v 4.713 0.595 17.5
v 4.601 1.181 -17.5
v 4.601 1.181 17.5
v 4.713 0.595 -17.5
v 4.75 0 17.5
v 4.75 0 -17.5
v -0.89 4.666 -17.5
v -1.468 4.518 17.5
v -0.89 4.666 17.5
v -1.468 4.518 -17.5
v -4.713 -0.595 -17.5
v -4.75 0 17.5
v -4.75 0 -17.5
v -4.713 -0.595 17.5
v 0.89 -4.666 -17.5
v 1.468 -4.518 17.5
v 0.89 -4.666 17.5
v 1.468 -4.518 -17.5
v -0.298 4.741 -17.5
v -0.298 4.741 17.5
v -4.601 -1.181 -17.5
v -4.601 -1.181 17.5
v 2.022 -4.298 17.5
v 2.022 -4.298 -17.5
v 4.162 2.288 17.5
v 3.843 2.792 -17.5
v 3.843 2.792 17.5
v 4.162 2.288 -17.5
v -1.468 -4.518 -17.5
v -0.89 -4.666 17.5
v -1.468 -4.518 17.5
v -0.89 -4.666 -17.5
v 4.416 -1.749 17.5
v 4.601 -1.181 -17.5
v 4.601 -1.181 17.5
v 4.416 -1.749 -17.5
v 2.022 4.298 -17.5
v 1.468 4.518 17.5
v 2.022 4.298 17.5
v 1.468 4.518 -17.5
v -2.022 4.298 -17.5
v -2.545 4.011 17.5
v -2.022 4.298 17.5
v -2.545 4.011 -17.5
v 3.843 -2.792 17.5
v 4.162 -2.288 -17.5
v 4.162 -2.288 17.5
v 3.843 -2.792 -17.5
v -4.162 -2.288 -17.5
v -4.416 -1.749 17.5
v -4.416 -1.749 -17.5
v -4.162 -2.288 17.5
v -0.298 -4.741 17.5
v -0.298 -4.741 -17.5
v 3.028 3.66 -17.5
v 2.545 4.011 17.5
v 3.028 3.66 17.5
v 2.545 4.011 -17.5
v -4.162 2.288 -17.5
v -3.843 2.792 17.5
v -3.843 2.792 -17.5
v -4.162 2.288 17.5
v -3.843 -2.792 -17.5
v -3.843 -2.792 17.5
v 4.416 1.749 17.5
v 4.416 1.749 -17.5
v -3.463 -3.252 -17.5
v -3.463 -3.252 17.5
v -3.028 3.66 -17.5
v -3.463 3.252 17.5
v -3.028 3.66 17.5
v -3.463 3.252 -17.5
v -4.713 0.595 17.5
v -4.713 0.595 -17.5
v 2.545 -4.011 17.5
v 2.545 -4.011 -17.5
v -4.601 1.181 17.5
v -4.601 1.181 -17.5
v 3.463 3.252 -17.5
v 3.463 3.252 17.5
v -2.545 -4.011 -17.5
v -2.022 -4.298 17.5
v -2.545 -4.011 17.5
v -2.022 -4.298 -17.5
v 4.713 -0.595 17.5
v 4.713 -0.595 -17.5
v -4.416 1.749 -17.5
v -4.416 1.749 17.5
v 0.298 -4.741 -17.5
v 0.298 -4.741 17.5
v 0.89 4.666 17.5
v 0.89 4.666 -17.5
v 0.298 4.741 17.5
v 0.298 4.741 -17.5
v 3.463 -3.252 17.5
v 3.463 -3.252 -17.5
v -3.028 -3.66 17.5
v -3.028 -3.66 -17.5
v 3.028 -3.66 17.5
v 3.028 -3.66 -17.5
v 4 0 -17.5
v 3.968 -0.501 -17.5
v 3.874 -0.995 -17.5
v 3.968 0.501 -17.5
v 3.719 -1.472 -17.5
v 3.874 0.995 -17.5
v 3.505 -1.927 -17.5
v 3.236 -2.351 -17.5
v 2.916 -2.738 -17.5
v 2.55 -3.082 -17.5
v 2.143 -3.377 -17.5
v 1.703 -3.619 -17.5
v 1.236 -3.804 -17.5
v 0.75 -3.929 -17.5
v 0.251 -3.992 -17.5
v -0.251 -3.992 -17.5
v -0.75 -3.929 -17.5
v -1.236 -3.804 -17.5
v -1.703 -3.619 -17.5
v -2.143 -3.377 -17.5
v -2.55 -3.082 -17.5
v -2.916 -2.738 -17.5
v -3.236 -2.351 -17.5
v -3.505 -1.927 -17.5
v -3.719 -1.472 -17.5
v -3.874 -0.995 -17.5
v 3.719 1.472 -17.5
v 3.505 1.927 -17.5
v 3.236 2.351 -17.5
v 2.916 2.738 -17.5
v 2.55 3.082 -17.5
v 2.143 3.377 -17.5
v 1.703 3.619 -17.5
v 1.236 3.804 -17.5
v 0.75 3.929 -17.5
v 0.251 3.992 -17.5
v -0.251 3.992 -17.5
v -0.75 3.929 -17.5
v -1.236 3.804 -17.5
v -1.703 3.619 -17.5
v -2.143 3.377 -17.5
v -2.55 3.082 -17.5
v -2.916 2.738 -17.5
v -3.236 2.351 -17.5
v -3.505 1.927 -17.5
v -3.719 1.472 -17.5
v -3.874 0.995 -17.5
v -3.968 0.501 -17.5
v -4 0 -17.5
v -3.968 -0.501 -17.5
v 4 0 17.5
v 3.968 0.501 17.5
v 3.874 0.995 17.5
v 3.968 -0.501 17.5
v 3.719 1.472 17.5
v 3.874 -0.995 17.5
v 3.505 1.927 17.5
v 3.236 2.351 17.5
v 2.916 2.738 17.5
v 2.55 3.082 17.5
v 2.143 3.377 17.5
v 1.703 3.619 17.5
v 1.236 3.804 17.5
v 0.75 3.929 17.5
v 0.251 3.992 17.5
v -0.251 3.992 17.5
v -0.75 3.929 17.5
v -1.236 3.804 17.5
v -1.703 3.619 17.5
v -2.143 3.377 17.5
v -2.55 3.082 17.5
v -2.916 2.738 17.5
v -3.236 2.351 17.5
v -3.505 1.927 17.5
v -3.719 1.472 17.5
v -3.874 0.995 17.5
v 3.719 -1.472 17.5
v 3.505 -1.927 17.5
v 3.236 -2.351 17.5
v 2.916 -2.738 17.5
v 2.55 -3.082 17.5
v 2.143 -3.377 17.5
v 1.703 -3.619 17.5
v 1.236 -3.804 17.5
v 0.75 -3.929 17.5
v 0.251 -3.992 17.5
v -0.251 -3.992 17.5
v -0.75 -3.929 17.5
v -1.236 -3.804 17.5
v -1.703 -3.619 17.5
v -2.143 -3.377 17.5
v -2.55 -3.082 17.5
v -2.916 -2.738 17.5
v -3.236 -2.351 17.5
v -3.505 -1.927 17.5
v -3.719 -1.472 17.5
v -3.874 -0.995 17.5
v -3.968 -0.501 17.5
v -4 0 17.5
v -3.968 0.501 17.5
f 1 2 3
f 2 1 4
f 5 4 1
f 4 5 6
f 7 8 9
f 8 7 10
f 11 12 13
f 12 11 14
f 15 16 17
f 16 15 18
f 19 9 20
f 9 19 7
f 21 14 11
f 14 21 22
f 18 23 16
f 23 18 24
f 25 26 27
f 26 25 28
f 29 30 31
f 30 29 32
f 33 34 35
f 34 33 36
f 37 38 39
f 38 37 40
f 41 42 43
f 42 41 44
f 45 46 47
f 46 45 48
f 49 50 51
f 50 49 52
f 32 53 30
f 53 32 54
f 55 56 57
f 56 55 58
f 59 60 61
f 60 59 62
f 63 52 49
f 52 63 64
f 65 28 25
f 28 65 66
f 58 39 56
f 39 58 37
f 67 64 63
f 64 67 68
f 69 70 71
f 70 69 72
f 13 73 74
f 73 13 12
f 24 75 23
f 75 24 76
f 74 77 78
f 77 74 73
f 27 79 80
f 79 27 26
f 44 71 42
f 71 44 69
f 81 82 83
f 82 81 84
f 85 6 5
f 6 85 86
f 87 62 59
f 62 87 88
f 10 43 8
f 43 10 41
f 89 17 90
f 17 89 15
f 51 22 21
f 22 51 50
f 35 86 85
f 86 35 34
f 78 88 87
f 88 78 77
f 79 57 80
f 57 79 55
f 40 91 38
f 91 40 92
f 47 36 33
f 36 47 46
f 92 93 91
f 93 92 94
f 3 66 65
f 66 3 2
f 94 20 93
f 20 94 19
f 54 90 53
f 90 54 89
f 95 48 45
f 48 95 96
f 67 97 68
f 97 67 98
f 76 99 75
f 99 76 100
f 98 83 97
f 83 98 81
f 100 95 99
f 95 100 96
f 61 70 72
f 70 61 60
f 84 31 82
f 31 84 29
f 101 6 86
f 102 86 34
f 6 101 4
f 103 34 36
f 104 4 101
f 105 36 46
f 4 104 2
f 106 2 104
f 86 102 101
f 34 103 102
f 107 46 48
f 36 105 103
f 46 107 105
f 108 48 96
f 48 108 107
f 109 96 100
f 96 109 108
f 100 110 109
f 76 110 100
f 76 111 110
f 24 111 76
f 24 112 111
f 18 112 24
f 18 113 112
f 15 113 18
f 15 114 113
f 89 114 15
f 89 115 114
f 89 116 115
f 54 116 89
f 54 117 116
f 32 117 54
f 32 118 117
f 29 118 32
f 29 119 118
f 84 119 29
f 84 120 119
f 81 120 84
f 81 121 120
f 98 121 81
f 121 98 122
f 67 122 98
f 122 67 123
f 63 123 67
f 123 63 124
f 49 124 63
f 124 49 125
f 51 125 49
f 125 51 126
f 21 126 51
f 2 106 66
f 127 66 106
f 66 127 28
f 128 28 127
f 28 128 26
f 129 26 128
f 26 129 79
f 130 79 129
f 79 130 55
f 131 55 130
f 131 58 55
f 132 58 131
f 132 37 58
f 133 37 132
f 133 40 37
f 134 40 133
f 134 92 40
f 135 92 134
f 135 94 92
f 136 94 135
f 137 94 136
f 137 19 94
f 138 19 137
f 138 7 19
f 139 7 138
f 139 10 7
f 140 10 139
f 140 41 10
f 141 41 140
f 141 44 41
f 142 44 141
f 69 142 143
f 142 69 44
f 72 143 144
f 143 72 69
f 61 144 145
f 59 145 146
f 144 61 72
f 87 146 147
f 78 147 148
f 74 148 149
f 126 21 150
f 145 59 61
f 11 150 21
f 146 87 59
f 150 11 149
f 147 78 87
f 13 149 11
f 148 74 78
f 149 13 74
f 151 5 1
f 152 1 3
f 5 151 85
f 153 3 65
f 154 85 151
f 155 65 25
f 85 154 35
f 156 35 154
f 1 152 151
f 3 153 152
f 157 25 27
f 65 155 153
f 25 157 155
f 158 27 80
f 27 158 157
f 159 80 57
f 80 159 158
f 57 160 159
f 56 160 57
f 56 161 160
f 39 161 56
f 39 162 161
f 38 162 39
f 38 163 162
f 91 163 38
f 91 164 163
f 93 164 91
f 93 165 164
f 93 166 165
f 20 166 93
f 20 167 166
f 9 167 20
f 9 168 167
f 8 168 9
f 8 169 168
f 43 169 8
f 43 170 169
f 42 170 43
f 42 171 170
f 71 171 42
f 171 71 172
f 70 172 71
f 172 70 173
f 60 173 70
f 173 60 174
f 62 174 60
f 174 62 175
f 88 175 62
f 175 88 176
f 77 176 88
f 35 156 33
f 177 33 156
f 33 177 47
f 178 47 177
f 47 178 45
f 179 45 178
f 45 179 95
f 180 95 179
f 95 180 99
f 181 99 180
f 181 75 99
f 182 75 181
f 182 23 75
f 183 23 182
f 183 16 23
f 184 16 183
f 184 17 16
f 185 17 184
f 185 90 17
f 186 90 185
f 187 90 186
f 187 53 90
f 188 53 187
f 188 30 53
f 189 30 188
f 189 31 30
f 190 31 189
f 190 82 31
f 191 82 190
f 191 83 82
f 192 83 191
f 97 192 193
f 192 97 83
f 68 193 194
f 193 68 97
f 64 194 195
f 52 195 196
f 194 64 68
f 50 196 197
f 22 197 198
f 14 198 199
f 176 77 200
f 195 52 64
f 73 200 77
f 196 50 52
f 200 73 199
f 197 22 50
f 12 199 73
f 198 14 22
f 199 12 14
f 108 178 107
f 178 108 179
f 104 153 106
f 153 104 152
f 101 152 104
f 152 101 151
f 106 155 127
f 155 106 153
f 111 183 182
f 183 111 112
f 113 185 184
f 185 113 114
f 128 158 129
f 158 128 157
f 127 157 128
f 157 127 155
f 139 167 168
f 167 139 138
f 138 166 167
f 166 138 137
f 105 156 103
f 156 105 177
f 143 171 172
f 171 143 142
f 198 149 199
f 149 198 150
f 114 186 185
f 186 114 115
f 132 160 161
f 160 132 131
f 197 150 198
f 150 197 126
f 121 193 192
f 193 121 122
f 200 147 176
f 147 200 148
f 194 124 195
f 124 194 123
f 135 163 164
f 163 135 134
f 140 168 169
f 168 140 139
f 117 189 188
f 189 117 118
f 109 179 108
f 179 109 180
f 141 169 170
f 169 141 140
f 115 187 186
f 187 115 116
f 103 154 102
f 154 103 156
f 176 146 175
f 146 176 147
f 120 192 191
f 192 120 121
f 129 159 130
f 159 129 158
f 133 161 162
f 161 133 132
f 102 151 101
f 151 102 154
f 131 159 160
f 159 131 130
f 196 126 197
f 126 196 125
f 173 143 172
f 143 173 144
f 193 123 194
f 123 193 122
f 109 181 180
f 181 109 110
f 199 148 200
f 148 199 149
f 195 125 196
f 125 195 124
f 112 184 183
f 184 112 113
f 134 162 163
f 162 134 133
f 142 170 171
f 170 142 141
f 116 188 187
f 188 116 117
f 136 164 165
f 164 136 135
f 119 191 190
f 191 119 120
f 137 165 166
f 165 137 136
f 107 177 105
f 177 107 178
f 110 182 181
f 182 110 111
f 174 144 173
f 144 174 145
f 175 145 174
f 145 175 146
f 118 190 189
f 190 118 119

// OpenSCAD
$fn = 50;


difference() {
	union() {
		translate(v = [0, 0, -17.5000000000]) {
			cylinder(h = 35, r = 4.7500000000);
		}
	}
	union() {
		translate(v = [0, 0, -100.0000000000]) {
			cylinder(h = 200, r = 4.0000000000);
		}
	}
}
